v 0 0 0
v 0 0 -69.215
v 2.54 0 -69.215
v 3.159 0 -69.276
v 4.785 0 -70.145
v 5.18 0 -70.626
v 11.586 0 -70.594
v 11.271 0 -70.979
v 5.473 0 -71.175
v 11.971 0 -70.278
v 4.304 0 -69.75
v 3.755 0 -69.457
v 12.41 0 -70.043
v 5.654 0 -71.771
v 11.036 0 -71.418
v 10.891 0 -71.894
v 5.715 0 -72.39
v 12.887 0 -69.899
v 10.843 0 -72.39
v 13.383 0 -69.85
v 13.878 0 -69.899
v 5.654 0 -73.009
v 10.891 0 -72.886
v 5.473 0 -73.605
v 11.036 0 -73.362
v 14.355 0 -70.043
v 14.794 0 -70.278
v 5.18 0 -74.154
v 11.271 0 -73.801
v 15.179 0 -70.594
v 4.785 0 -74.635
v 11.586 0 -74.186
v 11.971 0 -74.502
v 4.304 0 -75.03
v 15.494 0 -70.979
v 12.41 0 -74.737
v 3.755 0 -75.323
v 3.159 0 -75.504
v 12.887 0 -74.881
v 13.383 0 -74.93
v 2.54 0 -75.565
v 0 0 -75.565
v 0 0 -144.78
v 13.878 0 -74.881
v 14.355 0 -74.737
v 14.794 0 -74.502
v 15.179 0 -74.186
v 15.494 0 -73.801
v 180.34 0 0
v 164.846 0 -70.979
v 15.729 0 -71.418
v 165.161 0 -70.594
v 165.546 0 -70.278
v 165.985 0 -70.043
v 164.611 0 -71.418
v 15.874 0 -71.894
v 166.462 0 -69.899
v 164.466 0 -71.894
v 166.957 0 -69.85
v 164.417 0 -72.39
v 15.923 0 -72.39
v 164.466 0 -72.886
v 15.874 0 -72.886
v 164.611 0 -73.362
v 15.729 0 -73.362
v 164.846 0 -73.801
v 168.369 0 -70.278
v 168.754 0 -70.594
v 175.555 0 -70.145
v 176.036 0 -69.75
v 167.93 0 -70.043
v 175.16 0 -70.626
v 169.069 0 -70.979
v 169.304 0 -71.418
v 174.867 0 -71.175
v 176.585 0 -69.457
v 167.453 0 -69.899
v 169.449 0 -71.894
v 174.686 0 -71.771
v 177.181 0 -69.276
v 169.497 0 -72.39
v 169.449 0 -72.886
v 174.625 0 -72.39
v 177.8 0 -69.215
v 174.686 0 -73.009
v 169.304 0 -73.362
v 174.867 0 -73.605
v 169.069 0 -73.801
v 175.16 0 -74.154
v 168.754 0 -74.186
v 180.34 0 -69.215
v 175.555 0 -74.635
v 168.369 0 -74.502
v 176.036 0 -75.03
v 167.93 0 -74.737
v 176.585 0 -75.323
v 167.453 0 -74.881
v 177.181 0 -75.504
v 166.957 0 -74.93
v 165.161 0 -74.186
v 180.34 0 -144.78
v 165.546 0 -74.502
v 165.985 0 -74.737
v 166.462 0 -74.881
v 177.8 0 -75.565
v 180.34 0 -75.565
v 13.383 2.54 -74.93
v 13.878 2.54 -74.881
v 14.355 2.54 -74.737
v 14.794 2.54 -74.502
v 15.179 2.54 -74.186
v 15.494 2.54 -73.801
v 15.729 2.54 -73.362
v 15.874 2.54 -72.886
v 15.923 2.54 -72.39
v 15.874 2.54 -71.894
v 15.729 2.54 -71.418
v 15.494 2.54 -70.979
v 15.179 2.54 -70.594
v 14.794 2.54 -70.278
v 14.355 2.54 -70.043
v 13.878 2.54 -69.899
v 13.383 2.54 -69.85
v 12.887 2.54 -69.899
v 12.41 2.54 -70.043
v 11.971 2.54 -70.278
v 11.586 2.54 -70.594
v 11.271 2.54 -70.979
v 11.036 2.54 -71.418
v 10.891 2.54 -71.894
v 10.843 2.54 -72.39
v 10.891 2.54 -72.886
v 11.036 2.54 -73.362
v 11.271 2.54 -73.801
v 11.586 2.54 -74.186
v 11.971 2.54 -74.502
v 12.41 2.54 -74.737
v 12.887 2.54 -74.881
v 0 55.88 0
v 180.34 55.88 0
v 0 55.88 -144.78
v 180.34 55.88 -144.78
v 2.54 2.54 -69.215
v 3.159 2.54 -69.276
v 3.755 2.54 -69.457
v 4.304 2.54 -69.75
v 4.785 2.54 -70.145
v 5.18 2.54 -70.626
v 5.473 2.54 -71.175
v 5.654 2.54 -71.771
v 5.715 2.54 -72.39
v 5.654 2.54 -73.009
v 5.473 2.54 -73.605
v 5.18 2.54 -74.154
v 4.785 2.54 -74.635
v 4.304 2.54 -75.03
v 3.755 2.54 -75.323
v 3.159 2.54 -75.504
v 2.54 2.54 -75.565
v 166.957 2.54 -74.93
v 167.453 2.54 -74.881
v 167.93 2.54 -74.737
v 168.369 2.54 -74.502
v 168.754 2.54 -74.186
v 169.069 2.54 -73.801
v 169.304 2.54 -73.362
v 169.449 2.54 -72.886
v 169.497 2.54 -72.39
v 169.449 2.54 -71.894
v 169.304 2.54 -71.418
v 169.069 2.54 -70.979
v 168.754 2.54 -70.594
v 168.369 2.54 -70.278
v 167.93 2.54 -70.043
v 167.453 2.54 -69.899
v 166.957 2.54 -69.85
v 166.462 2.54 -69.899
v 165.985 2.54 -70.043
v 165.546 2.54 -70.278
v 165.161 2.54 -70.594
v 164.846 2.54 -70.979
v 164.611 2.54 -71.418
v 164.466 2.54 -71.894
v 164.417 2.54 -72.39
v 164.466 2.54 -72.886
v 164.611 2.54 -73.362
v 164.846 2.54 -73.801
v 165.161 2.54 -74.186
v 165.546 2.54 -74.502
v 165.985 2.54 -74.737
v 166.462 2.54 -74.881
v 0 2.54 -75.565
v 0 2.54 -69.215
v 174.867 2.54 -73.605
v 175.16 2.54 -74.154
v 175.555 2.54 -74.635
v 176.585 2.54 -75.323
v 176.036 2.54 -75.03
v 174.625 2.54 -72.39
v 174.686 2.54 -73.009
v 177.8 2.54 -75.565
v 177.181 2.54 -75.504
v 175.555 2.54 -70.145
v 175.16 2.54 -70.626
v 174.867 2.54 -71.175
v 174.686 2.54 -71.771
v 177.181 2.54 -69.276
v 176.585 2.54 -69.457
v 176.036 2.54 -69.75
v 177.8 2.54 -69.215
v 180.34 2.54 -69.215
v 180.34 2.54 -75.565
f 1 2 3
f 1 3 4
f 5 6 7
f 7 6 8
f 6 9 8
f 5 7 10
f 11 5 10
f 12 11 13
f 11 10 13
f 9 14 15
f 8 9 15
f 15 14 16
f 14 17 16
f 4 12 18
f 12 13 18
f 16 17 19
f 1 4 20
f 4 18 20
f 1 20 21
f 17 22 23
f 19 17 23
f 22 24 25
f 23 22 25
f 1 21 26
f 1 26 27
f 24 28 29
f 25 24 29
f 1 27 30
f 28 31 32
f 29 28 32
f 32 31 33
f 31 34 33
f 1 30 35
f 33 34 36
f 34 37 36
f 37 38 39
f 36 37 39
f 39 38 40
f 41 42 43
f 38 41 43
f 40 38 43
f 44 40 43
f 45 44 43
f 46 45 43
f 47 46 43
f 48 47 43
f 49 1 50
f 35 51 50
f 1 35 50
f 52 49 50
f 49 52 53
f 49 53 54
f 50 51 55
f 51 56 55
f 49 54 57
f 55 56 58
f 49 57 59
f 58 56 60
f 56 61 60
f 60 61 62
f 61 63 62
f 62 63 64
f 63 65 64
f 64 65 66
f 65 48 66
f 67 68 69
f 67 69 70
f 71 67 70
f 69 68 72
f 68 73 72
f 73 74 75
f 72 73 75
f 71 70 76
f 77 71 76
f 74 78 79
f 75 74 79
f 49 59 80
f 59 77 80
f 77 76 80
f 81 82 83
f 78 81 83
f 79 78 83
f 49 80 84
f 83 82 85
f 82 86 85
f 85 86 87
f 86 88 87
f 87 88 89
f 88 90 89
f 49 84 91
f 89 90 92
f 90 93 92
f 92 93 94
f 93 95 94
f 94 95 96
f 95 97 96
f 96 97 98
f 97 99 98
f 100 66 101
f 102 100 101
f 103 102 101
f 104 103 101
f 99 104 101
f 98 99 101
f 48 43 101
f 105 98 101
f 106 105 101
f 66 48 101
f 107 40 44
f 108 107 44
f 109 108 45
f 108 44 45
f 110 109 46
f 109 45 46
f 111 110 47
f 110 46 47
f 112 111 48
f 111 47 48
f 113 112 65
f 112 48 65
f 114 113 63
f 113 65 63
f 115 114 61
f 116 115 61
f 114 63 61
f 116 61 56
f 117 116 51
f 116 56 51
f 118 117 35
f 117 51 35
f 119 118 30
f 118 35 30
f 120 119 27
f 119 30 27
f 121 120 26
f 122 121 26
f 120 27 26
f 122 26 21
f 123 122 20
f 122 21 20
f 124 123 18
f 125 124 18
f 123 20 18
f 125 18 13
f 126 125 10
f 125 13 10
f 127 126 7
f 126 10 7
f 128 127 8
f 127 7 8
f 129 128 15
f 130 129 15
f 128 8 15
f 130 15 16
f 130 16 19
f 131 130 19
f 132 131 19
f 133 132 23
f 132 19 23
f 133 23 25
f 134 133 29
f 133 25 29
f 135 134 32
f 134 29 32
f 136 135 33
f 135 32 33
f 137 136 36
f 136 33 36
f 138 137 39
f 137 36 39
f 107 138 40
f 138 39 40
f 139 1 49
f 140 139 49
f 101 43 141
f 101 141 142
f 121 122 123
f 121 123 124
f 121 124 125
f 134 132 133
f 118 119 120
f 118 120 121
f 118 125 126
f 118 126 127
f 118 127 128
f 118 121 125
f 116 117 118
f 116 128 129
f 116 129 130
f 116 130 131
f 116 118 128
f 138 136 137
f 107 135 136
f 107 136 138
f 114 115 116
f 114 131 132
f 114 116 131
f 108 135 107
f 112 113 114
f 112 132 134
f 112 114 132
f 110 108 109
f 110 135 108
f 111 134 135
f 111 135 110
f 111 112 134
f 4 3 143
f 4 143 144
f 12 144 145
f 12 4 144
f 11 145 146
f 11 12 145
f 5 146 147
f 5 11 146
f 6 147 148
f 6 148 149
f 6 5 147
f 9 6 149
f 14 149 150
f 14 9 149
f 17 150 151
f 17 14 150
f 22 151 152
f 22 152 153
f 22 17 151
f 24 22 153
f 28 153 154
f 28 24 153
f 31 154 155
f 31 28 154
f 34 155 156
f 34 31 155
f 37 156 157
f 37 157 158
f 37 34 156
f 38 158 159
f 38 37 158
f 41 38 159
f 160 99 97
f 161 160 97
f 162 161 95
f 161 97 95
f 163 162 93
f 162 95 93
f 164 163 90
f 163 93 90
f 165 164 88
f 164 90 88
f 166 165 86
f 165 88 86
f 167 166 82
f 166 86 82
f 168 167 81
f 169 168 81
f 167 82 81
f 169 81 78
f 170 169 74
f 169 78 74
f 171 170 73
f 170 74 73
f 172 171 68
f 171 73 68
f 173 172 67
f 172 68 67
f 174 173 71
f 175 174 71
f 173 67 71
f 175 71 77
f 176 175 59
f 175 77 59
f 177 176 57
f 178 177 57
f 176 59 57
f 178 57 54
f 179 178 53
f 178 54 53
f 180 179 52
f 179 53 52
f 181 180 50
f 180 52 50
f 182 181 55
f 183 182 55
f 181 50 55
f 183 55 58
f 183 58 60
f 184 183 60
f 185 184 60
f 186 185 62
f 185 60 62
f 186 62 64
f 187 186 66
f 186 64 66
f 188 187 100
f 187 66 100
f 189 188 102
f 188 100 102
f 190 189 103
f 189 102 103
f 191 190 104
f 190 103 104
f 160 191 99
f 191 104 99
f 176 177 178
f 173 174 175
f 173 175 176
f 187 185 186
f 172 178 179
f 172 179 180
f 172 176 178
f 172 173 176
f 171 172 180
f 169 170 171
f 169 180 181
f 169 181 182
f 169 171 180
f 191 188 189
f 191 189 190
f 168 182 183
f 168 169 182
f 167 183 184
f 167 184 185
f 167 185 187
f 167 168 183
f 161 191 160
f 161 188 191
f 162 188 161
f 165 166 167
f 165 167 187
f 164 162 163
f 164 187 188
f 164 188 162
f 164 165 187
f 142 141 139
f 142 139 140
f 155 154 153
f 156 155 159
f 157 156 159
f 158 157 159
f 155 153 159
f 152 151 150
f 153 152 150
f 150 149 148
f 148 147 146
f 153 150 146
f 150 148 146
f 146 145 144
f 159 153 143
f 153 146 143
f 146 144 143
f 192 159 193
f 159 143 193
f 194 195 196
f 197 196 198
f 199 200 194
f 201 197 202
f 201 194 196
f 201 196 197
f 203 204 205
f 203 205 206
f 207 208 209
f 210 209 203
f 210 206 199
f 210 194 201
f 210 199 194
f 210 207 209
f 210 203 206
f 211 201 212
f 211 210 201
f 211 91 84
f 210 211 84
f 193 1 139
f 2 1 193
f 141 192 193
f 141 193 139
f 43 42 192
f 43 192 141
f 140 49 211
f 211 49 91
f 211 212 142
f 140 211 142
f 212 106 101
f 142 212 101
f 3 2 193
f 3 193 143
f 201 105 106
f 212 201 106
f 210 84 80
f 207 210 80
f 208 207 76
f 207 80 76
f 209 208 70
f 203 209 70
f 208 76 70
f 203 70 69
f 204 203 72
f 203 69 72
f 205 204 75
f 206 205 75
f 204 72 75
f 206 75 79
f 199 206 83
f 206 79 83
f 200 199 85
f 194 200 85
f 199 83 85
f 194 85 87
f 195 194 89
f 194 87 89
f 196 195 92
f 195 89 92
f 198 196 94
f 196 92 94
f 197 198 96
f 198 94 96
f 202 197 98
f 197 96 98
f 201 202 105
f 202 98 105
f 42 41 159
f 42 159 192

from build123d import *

# Parameters (mm, degrees)
SKETCH2_W           = 180.34
SKETCH2_H           = 144.78
BOSS_EXTRUDE1_DEPTH = 55.88
CUT_EXTRUDE2_DEPTH  = 2.54
SKETCH3_R           = 2.54
CUT_EXTRUDE1_DEPTH  = 2.54


with BuildPart() as part:
    # Sketch2 → Boss-Extrude1 (new body)
    with BuildSketch(Plane(origin=(0, 0, 0), x_dir=(1, 0, 0), z_dir=(0, 1, 0))):
        with Locations((90.17, 72.39)):
            Rectangle(SKETCH2_W, SKETCH2_H)
    extrude(amount=BOSS_EXTRUDE1_DEPTH)

    # Sketch4 → Cut-Extrude2 (cut)
    with BuildSketch(Plane.XZ):
        with BuildLine():
            Line((0, -69.215), (2.54, -69.215))
            ThreePointArc((2.54, -69.215), (5.715, -72.39), (2.54, -75.565))
            Line((2.54, -75.565), (0, -75.565))
            ThreePointArc((0, -75.565), (-3.175, -72.39), (0, -69.215))
        make_face()
        with BuildLine():
            Line((180.34, -69.215), (177.8, -69.215))
            ThreePointArc((177.8, -69.215), (174.625, -72.39), (177.8, -75.565))
            Line((177.8, -75.565), (180.34, -75.565))
            ThreePointArc((180.34, -75.565), (183.515, -72.39), (180.34, -69.215))
        make_face()
    extrude(amount=-CUT_EXTRUDE2_DEPTH, mode=Mode.SUBTRACT)

    # Sketch3 → Cut-Extrude1 (cut)
    with BuildSketch(Plane.XZ):
        with Locations(Location((13.382501665, -72.39, 0), (0, 0, 270))):
            Circle(SKETCH3_R)
        with Locations(Location((166.957498335, -72.39, 0), (0, 0, 270))):
            Circle(SKETCH3_R)
    extrude(amount=-CUT_EXTRUDE1_DEPTH, mode=Mode.SUBTRACT)


solid = part.part
